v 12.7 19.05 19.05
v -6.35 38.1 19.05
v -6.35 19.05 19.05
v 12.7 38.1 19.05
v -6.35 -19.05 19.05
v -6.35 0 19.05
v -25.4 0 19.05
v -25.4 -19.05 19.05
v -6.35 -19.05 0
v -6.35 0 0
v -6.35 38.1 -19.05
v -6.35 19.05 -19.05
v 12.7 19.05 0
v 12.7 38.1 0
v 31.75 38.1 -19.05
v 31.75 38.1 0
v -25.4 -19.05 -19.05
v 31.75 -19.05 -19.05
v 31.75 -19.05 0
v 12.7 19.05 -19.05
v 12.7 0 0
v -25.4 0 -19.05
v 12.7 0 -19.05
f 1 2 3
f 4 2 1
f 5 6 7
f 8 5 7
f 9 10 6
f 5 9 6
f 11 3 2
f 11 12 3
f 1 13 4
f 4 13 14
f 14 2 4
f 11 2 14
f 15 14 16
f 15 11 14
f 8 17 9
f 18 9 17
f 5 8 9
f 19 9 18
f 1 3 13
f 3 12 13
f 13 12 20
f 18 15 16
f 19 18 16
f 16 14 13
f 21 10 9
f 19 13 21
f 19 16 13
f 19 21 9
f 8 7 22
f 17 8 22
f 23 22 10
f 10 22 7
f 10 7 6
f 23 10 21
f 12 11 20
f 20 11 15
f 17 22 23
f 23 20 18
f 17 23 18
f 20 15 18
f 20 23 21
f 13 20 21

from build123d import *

# Parameters (mm, degrees)
F1_DEPTH = 19.05
F2_W     = 19.05
F2_H     = 19.05
F3_DEPTH = 38.1
F4_W     = 19.05
F4_H     = 19.05
F5_DEPTH = 19.05
F6_W     = 19.05
F6_H     = 19.05
F7_DEPTH = 19.05


with BuildPart() as f1:
    # F0 (on Front) → F1 (new body)
    with BuildSketch(Plane.XZ):
        Polygon((-25.4, 19.05), (-25.4, -19.05), (31.75, -19.05), (31.75, 0), (-6.35, 0), (-6.35, 19.05), align=None)
    extrude(amount=F1_DEPTH)

    # F2 (on face) → F3 (join)
    with BuildSketch(Plane(origin=(0, 0, 0), x_dir=(-1, 0, 0), z_dir=(0, 1, 0))):
        with Locations((-22.225, -9.525)):
            Rectangle(F2_W, F2_H)
    extrude(amount=F3_DEPTH)

    # F4 (on face) → F5 (join)
    with BuildSketch(Plane(origin=(12.7, 0, 0), x_dir=(0, -1, 0), z_dir=(-1, 0, 0))):
        with Locations((-28.575, -9.525)):
            Rectangle(F4_W, F4_H)
    extrude(amount=F5_DEPTH)

    # F6 (on face) → F7 (join)
    with BuildSketch(Plane.XY):
        with Locations((3.175, 28.575)):
            Rectangle(F6_W, F6_H)
    extrude(amount=F7_DEPTH)


solid = f1.part
